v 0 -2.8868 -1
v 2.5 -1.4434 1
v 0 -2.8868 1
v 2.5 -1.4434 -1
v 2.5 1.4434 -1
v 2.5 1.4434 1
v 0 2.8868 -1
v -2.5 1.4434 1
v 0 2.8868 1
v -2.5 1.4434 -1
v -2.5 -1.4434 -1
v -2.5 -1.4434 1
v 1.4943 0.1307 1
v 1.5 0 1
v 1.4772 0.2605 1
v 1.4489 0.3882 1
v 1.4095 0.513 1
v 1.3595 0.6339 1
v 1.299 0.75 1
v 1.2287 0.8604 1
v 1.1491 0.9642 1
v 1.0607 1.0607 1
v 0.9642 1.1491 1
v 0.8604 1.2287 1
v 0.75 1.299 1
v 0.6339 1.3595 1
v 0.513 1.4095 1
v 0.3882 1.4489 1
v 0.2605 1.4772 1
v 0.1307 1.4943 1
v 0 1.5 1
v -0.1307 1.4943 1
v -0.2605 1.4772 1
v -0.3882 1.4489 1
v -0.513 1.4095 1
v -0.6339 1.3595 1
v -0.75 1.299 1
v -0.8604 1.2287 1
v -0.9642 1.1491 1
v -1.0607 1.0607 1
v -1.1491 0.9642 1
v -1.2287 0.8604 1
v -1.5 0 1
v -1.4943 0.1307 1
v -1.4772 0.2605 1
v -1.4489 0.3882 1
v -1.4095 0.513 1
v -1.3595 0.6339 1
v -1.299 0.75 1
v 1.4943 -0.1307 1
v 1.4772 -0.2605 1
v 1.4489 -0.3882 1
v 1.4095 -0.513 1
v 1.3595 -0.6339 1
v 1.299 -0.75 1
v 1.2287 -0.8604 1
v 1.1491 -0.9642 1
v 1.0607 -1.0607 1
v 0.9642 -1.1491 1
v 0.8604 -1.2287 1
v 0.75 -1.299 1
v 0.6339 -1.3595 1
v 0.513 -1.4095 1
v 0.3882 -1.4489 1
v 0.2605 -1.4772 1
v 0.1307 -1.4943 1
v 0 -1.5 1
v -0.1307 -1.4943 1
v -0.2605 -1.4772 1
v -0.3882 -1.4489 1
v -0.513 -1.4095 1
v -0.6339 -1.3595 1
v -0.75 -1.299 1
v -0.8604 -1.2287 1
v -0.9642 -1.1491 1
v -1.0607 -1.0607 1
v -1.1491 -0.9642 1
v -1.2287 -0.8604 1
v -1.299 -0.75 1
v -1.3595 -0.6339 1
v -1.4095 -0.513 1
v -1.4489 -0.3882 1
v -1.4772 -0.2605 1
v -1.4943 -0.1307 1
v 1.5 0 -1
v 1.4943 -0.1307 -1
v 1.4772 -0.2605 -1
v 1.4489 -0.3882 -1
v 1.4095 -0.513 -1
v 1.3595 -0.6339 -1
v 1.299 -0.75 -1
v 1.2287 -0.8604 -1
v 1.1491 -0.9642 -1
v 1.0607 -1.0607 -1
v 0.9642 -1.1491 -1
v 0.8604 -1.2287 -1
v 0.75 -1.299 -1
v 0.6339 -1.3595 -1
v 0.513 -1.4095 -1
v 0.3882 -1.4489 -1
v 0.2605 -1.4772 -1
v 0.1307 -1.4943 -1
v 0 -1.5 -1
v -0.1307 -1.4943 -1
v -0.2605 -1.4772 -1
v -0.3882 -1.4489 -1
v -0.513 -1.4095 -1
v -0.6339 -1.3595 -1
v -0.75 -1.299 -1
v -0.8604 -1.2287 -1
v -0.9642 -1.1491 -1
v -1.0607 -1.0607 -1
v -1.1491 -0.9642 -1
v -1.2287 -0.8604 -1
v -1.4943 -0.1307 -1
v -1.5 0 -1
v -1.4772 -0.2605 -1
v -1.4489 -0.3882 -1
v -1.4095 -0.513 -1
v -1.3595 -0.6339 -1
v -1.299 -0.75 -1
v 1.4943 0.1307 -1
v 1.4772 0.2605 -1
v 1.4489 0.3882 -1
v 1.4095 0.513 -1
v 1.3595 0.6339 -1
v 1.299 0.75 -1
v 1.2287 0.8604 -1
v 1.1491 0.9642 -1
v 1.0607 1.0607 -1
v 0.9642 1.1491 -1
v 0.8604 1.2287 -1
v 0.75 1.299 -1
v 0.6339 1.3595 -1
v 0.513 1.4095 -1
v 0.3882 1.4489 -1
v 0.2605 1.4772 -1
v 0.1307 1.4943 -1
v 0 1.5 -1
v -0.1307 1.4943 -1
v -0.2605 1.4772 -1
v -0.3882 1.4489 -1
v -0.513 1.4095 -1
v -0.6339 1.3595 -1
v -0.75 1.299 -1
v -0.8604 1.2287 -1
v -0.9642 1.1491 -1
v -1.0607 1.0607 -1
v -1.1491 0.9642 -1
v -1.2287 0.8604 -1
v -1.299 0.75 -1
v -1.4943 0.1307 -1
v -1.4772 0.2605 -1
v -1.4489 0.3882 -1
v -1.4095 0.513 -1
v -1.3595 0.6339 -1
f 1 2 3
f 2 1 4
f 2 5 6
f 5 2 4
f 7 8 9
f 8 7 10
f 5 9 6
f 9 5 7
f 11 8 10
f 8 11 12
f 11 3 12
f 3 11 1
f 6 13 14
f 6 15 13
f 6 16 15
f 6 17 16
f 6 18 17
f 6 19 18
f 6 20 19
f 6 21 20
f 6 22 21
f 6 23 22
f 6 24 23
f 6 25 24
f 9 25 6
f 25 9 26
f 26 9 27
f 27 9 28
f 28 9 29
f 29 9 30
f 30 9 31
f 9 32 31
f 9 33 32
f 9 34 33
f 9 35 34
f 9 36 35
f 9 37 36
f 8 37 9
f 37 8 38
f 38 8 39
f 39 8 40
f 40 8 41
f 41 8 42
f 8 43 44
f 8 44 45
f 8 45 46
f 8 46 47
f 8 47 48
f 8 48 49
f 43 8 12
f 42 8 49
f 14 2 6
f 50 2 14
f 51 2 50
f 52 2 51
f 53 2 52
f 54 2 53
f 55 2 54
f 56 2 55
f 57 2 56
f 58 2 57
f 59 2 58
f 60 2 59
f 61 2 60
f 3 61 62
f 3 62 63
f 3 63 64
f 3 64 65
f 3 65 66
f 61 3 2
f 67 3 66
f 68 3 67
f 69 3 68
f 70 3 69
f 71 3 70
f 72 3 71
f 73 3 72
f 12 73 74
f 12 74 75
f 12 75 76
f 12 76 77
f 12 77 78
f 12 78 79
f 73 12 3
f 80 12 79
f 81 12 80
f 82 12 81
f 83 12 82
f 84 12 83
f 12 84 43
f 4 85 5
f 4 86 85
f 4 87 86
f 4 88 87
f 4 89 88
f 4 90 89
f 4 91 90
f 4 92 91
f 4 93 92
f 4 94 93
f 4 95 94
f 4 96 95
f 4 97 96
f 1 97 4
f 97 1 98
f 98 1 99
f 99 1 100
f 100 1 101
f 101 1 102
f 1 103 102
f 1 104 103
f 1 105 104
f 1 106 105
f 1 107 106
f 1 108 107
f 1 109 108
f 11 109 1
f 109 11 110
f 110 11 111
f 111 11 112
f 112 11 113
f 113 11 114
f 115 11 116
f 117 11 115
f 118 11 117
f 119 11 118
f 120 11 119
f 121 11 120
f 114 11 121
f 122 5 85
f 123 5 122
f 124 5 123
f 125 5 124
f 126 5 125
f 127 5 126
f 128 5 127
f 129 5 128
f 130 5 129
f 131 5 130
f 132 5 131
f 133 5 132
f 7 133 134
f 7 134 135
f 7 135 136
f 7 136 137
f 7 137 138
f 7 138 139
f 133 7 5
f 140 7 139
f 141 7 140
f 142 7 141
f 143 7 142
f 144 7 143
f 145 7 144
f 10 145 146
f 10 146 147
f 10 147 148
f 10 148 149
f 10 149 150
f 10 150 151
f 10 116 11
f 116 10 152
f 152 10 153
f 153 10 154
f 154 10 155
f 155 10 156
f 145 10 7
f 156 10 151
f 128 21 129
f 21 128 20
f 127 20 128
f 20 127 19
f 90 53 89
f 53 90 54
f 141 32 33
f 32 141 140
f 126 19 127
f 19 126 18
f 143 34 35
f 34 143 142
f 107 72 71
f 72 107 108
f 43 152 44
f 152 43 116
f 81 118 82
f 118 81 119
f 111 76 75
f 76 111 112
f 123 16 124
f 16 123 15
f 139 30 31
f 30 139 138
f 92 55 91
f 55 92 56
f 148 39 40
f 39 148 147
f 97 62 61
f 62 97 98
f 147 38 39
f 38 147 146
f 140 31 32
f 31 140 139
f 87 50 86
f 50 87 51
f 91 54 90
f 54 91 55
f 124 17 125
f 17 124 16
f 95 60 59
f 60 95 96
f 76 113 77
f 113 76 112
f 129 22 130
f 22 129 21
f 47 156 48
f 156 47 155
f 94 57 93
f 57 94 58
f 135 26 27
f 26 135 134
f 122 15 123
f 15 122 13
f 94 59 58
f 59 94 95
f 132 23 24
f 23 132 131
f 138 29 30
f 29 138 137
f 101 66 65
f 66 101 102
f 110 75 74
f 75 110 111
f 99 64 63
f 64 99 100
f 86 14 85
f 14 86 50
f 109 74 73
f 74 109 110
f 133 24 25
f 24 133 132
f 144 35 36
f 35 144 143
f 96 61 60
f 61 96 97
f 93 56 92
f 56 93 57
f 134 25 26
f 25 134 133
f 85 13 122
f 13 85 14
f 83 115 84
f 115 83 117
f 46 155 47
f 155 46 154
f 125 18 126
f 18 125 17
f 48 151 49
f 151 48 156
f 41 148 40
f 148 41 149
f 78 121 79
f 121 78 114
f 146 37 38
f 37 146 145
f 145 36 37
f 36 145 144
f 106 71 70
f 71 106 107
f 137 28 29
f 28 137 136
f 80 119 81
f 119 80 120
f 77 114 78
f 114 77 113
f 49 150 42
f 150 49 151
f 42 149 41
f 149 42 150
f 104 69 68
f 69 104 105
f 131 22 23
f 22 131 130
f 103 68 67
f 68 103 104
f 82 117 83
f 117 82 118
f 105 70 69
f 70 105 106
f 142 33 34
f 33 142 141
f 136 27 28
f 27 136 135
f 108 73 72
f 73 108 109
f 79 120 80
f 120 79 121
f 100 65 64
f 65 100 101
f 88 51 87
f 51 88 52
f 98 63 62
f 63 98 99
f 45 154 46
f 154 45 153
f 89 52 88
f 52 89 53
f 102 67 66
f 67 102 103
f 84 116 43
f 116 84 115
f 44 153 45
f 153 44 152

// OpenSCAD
/**********************************************************
* SCAD construction library
*
* (C) 2018, Hermann Gebhard
*
*********************************************************/
$fn=72; eps=0.05;

function holeDia(d) = (d/cos(180/$fn));


// nut data according to DIN 934
// threadDia, wrenchWidth, nutHeight
nutData = [
    [1.6, 3.2, 1.3],
    [2, 4, 1.6],
    [2.5, 5 ,2], 
    [2.6, 5, 2],
    [3, 5.5, 2.4],
    [3.5, 6, 2.8],
    [4, 7, 3.2],
    [5, 8, 4],
    [6, 10, 5.2],
    [8, 13, 6.5],
    [10,17, 8],
];


_nww = [  for(i=[0:3]) let (th=nutData[i][0], ww=nutData[i][1]) [th,ww]   ];
_nh = [  for(i=[0:3]) let (th=nutData[i][0], nh=nutData[i][2]) [th,nh]   ];

function nutWrenchWidth(th) = lookup(th, _nww);
function nutHeight(th) = lookup(th, _nh);



module hexNut(threadDia){
    difference(){
        cylinder($fn=6, d=nutWrenchWidth(threadDia)/cos(30), h=nutHeight(threadDia), center=true);
       cylinder(d=threadDia, h=nutHeight(threadDia)+eps, center=true);
    }
}

/***********************************************************/
// xProfile(l=60, w=20, th=3)

module xProfile(l=60, w=20, th=3){
    intersection(){
        union(){
            rotate([0,0,+45])cube([2*w,th,l], center=true);
            rotate([0,0,-45])cube([2*w,th,l], center=true);
        }
        cube([w,w,l], center=true);
    }
}


/***********************************************************/
//donut(rTorus=10, rTube=3);

module donut(rTube, rTorus){
    rotate_extrude(angle=360)
        translate([rTorus,0,0])circle(r=rTube);
}

/***********************************************************/


module tube(do, di, h, center=false){
    difference(){
        cylinder(d=do, h=h, center=center);
        translate([0,0,-eps])cylinder(d=holeDia(di), h=h+2*eps, center=center);
    }
}

/***********************************************************/

module rectTube(w, h, l, wall){
    linear_extrude(l){
        difference(){
            square([w,h], center=true);
            square([w-2*wall,h-2*wall], center=true);
        }
    }
}

/***********************************************************/

module rowOfHoles(dia, numHoles, holeSpacing, holeHeight){
    for (i=[0:numHoles-1]) translate([0,i*holeSpacing,-eps])    cylinder(d=holeDia(dia), h=holeHeight+2*eps);
}

/***********************************************************/


module profile(hLeft, bottomWidth, hRight, thickness, length){
    translate([-bottomWidth/2,0,0]){
        cube([thickness, length, hLeft]);
        cube([bottomWidth,length,thickness]);
        translate([bottomWidth-thickness,0,0])cube([thickness, length, hRight]);
    }
}


/******************* Examples ******************************/
/***********************************************************/

/*
// wrench adapter
difference(){
    intersection(){
        translate([0,0,-0.5])sphere(d=19.4);
        translate([0,0,+0.5])sphere(d=19.4);
        translate([0,0,-5/2])difference(){
            cylinder(d=holeDia(17), h=5, $fn=6);
            translate([0,0,-eps])cylinder(d=holeDia(10), h=5+2*eps, $fn=6);
        }
    }
    translate([0,-17/2+1.7,5/2-0.5])linear_extrude(0.6)text("HG", font="Tex Gyre Heros", size=2, halign="center", valign="center");
}

// Profile with holes
difference(){
    profile(60,30,0,5,50);
    translate([0,12.5/2,0])rowOfHoles(dia=6, numHoles=2, holeSpacing=35, holeHeight=5);
}
*/
hexNut(2); translate([8,0,0]) 
!rotate([0,0,30])hexNut(3);
